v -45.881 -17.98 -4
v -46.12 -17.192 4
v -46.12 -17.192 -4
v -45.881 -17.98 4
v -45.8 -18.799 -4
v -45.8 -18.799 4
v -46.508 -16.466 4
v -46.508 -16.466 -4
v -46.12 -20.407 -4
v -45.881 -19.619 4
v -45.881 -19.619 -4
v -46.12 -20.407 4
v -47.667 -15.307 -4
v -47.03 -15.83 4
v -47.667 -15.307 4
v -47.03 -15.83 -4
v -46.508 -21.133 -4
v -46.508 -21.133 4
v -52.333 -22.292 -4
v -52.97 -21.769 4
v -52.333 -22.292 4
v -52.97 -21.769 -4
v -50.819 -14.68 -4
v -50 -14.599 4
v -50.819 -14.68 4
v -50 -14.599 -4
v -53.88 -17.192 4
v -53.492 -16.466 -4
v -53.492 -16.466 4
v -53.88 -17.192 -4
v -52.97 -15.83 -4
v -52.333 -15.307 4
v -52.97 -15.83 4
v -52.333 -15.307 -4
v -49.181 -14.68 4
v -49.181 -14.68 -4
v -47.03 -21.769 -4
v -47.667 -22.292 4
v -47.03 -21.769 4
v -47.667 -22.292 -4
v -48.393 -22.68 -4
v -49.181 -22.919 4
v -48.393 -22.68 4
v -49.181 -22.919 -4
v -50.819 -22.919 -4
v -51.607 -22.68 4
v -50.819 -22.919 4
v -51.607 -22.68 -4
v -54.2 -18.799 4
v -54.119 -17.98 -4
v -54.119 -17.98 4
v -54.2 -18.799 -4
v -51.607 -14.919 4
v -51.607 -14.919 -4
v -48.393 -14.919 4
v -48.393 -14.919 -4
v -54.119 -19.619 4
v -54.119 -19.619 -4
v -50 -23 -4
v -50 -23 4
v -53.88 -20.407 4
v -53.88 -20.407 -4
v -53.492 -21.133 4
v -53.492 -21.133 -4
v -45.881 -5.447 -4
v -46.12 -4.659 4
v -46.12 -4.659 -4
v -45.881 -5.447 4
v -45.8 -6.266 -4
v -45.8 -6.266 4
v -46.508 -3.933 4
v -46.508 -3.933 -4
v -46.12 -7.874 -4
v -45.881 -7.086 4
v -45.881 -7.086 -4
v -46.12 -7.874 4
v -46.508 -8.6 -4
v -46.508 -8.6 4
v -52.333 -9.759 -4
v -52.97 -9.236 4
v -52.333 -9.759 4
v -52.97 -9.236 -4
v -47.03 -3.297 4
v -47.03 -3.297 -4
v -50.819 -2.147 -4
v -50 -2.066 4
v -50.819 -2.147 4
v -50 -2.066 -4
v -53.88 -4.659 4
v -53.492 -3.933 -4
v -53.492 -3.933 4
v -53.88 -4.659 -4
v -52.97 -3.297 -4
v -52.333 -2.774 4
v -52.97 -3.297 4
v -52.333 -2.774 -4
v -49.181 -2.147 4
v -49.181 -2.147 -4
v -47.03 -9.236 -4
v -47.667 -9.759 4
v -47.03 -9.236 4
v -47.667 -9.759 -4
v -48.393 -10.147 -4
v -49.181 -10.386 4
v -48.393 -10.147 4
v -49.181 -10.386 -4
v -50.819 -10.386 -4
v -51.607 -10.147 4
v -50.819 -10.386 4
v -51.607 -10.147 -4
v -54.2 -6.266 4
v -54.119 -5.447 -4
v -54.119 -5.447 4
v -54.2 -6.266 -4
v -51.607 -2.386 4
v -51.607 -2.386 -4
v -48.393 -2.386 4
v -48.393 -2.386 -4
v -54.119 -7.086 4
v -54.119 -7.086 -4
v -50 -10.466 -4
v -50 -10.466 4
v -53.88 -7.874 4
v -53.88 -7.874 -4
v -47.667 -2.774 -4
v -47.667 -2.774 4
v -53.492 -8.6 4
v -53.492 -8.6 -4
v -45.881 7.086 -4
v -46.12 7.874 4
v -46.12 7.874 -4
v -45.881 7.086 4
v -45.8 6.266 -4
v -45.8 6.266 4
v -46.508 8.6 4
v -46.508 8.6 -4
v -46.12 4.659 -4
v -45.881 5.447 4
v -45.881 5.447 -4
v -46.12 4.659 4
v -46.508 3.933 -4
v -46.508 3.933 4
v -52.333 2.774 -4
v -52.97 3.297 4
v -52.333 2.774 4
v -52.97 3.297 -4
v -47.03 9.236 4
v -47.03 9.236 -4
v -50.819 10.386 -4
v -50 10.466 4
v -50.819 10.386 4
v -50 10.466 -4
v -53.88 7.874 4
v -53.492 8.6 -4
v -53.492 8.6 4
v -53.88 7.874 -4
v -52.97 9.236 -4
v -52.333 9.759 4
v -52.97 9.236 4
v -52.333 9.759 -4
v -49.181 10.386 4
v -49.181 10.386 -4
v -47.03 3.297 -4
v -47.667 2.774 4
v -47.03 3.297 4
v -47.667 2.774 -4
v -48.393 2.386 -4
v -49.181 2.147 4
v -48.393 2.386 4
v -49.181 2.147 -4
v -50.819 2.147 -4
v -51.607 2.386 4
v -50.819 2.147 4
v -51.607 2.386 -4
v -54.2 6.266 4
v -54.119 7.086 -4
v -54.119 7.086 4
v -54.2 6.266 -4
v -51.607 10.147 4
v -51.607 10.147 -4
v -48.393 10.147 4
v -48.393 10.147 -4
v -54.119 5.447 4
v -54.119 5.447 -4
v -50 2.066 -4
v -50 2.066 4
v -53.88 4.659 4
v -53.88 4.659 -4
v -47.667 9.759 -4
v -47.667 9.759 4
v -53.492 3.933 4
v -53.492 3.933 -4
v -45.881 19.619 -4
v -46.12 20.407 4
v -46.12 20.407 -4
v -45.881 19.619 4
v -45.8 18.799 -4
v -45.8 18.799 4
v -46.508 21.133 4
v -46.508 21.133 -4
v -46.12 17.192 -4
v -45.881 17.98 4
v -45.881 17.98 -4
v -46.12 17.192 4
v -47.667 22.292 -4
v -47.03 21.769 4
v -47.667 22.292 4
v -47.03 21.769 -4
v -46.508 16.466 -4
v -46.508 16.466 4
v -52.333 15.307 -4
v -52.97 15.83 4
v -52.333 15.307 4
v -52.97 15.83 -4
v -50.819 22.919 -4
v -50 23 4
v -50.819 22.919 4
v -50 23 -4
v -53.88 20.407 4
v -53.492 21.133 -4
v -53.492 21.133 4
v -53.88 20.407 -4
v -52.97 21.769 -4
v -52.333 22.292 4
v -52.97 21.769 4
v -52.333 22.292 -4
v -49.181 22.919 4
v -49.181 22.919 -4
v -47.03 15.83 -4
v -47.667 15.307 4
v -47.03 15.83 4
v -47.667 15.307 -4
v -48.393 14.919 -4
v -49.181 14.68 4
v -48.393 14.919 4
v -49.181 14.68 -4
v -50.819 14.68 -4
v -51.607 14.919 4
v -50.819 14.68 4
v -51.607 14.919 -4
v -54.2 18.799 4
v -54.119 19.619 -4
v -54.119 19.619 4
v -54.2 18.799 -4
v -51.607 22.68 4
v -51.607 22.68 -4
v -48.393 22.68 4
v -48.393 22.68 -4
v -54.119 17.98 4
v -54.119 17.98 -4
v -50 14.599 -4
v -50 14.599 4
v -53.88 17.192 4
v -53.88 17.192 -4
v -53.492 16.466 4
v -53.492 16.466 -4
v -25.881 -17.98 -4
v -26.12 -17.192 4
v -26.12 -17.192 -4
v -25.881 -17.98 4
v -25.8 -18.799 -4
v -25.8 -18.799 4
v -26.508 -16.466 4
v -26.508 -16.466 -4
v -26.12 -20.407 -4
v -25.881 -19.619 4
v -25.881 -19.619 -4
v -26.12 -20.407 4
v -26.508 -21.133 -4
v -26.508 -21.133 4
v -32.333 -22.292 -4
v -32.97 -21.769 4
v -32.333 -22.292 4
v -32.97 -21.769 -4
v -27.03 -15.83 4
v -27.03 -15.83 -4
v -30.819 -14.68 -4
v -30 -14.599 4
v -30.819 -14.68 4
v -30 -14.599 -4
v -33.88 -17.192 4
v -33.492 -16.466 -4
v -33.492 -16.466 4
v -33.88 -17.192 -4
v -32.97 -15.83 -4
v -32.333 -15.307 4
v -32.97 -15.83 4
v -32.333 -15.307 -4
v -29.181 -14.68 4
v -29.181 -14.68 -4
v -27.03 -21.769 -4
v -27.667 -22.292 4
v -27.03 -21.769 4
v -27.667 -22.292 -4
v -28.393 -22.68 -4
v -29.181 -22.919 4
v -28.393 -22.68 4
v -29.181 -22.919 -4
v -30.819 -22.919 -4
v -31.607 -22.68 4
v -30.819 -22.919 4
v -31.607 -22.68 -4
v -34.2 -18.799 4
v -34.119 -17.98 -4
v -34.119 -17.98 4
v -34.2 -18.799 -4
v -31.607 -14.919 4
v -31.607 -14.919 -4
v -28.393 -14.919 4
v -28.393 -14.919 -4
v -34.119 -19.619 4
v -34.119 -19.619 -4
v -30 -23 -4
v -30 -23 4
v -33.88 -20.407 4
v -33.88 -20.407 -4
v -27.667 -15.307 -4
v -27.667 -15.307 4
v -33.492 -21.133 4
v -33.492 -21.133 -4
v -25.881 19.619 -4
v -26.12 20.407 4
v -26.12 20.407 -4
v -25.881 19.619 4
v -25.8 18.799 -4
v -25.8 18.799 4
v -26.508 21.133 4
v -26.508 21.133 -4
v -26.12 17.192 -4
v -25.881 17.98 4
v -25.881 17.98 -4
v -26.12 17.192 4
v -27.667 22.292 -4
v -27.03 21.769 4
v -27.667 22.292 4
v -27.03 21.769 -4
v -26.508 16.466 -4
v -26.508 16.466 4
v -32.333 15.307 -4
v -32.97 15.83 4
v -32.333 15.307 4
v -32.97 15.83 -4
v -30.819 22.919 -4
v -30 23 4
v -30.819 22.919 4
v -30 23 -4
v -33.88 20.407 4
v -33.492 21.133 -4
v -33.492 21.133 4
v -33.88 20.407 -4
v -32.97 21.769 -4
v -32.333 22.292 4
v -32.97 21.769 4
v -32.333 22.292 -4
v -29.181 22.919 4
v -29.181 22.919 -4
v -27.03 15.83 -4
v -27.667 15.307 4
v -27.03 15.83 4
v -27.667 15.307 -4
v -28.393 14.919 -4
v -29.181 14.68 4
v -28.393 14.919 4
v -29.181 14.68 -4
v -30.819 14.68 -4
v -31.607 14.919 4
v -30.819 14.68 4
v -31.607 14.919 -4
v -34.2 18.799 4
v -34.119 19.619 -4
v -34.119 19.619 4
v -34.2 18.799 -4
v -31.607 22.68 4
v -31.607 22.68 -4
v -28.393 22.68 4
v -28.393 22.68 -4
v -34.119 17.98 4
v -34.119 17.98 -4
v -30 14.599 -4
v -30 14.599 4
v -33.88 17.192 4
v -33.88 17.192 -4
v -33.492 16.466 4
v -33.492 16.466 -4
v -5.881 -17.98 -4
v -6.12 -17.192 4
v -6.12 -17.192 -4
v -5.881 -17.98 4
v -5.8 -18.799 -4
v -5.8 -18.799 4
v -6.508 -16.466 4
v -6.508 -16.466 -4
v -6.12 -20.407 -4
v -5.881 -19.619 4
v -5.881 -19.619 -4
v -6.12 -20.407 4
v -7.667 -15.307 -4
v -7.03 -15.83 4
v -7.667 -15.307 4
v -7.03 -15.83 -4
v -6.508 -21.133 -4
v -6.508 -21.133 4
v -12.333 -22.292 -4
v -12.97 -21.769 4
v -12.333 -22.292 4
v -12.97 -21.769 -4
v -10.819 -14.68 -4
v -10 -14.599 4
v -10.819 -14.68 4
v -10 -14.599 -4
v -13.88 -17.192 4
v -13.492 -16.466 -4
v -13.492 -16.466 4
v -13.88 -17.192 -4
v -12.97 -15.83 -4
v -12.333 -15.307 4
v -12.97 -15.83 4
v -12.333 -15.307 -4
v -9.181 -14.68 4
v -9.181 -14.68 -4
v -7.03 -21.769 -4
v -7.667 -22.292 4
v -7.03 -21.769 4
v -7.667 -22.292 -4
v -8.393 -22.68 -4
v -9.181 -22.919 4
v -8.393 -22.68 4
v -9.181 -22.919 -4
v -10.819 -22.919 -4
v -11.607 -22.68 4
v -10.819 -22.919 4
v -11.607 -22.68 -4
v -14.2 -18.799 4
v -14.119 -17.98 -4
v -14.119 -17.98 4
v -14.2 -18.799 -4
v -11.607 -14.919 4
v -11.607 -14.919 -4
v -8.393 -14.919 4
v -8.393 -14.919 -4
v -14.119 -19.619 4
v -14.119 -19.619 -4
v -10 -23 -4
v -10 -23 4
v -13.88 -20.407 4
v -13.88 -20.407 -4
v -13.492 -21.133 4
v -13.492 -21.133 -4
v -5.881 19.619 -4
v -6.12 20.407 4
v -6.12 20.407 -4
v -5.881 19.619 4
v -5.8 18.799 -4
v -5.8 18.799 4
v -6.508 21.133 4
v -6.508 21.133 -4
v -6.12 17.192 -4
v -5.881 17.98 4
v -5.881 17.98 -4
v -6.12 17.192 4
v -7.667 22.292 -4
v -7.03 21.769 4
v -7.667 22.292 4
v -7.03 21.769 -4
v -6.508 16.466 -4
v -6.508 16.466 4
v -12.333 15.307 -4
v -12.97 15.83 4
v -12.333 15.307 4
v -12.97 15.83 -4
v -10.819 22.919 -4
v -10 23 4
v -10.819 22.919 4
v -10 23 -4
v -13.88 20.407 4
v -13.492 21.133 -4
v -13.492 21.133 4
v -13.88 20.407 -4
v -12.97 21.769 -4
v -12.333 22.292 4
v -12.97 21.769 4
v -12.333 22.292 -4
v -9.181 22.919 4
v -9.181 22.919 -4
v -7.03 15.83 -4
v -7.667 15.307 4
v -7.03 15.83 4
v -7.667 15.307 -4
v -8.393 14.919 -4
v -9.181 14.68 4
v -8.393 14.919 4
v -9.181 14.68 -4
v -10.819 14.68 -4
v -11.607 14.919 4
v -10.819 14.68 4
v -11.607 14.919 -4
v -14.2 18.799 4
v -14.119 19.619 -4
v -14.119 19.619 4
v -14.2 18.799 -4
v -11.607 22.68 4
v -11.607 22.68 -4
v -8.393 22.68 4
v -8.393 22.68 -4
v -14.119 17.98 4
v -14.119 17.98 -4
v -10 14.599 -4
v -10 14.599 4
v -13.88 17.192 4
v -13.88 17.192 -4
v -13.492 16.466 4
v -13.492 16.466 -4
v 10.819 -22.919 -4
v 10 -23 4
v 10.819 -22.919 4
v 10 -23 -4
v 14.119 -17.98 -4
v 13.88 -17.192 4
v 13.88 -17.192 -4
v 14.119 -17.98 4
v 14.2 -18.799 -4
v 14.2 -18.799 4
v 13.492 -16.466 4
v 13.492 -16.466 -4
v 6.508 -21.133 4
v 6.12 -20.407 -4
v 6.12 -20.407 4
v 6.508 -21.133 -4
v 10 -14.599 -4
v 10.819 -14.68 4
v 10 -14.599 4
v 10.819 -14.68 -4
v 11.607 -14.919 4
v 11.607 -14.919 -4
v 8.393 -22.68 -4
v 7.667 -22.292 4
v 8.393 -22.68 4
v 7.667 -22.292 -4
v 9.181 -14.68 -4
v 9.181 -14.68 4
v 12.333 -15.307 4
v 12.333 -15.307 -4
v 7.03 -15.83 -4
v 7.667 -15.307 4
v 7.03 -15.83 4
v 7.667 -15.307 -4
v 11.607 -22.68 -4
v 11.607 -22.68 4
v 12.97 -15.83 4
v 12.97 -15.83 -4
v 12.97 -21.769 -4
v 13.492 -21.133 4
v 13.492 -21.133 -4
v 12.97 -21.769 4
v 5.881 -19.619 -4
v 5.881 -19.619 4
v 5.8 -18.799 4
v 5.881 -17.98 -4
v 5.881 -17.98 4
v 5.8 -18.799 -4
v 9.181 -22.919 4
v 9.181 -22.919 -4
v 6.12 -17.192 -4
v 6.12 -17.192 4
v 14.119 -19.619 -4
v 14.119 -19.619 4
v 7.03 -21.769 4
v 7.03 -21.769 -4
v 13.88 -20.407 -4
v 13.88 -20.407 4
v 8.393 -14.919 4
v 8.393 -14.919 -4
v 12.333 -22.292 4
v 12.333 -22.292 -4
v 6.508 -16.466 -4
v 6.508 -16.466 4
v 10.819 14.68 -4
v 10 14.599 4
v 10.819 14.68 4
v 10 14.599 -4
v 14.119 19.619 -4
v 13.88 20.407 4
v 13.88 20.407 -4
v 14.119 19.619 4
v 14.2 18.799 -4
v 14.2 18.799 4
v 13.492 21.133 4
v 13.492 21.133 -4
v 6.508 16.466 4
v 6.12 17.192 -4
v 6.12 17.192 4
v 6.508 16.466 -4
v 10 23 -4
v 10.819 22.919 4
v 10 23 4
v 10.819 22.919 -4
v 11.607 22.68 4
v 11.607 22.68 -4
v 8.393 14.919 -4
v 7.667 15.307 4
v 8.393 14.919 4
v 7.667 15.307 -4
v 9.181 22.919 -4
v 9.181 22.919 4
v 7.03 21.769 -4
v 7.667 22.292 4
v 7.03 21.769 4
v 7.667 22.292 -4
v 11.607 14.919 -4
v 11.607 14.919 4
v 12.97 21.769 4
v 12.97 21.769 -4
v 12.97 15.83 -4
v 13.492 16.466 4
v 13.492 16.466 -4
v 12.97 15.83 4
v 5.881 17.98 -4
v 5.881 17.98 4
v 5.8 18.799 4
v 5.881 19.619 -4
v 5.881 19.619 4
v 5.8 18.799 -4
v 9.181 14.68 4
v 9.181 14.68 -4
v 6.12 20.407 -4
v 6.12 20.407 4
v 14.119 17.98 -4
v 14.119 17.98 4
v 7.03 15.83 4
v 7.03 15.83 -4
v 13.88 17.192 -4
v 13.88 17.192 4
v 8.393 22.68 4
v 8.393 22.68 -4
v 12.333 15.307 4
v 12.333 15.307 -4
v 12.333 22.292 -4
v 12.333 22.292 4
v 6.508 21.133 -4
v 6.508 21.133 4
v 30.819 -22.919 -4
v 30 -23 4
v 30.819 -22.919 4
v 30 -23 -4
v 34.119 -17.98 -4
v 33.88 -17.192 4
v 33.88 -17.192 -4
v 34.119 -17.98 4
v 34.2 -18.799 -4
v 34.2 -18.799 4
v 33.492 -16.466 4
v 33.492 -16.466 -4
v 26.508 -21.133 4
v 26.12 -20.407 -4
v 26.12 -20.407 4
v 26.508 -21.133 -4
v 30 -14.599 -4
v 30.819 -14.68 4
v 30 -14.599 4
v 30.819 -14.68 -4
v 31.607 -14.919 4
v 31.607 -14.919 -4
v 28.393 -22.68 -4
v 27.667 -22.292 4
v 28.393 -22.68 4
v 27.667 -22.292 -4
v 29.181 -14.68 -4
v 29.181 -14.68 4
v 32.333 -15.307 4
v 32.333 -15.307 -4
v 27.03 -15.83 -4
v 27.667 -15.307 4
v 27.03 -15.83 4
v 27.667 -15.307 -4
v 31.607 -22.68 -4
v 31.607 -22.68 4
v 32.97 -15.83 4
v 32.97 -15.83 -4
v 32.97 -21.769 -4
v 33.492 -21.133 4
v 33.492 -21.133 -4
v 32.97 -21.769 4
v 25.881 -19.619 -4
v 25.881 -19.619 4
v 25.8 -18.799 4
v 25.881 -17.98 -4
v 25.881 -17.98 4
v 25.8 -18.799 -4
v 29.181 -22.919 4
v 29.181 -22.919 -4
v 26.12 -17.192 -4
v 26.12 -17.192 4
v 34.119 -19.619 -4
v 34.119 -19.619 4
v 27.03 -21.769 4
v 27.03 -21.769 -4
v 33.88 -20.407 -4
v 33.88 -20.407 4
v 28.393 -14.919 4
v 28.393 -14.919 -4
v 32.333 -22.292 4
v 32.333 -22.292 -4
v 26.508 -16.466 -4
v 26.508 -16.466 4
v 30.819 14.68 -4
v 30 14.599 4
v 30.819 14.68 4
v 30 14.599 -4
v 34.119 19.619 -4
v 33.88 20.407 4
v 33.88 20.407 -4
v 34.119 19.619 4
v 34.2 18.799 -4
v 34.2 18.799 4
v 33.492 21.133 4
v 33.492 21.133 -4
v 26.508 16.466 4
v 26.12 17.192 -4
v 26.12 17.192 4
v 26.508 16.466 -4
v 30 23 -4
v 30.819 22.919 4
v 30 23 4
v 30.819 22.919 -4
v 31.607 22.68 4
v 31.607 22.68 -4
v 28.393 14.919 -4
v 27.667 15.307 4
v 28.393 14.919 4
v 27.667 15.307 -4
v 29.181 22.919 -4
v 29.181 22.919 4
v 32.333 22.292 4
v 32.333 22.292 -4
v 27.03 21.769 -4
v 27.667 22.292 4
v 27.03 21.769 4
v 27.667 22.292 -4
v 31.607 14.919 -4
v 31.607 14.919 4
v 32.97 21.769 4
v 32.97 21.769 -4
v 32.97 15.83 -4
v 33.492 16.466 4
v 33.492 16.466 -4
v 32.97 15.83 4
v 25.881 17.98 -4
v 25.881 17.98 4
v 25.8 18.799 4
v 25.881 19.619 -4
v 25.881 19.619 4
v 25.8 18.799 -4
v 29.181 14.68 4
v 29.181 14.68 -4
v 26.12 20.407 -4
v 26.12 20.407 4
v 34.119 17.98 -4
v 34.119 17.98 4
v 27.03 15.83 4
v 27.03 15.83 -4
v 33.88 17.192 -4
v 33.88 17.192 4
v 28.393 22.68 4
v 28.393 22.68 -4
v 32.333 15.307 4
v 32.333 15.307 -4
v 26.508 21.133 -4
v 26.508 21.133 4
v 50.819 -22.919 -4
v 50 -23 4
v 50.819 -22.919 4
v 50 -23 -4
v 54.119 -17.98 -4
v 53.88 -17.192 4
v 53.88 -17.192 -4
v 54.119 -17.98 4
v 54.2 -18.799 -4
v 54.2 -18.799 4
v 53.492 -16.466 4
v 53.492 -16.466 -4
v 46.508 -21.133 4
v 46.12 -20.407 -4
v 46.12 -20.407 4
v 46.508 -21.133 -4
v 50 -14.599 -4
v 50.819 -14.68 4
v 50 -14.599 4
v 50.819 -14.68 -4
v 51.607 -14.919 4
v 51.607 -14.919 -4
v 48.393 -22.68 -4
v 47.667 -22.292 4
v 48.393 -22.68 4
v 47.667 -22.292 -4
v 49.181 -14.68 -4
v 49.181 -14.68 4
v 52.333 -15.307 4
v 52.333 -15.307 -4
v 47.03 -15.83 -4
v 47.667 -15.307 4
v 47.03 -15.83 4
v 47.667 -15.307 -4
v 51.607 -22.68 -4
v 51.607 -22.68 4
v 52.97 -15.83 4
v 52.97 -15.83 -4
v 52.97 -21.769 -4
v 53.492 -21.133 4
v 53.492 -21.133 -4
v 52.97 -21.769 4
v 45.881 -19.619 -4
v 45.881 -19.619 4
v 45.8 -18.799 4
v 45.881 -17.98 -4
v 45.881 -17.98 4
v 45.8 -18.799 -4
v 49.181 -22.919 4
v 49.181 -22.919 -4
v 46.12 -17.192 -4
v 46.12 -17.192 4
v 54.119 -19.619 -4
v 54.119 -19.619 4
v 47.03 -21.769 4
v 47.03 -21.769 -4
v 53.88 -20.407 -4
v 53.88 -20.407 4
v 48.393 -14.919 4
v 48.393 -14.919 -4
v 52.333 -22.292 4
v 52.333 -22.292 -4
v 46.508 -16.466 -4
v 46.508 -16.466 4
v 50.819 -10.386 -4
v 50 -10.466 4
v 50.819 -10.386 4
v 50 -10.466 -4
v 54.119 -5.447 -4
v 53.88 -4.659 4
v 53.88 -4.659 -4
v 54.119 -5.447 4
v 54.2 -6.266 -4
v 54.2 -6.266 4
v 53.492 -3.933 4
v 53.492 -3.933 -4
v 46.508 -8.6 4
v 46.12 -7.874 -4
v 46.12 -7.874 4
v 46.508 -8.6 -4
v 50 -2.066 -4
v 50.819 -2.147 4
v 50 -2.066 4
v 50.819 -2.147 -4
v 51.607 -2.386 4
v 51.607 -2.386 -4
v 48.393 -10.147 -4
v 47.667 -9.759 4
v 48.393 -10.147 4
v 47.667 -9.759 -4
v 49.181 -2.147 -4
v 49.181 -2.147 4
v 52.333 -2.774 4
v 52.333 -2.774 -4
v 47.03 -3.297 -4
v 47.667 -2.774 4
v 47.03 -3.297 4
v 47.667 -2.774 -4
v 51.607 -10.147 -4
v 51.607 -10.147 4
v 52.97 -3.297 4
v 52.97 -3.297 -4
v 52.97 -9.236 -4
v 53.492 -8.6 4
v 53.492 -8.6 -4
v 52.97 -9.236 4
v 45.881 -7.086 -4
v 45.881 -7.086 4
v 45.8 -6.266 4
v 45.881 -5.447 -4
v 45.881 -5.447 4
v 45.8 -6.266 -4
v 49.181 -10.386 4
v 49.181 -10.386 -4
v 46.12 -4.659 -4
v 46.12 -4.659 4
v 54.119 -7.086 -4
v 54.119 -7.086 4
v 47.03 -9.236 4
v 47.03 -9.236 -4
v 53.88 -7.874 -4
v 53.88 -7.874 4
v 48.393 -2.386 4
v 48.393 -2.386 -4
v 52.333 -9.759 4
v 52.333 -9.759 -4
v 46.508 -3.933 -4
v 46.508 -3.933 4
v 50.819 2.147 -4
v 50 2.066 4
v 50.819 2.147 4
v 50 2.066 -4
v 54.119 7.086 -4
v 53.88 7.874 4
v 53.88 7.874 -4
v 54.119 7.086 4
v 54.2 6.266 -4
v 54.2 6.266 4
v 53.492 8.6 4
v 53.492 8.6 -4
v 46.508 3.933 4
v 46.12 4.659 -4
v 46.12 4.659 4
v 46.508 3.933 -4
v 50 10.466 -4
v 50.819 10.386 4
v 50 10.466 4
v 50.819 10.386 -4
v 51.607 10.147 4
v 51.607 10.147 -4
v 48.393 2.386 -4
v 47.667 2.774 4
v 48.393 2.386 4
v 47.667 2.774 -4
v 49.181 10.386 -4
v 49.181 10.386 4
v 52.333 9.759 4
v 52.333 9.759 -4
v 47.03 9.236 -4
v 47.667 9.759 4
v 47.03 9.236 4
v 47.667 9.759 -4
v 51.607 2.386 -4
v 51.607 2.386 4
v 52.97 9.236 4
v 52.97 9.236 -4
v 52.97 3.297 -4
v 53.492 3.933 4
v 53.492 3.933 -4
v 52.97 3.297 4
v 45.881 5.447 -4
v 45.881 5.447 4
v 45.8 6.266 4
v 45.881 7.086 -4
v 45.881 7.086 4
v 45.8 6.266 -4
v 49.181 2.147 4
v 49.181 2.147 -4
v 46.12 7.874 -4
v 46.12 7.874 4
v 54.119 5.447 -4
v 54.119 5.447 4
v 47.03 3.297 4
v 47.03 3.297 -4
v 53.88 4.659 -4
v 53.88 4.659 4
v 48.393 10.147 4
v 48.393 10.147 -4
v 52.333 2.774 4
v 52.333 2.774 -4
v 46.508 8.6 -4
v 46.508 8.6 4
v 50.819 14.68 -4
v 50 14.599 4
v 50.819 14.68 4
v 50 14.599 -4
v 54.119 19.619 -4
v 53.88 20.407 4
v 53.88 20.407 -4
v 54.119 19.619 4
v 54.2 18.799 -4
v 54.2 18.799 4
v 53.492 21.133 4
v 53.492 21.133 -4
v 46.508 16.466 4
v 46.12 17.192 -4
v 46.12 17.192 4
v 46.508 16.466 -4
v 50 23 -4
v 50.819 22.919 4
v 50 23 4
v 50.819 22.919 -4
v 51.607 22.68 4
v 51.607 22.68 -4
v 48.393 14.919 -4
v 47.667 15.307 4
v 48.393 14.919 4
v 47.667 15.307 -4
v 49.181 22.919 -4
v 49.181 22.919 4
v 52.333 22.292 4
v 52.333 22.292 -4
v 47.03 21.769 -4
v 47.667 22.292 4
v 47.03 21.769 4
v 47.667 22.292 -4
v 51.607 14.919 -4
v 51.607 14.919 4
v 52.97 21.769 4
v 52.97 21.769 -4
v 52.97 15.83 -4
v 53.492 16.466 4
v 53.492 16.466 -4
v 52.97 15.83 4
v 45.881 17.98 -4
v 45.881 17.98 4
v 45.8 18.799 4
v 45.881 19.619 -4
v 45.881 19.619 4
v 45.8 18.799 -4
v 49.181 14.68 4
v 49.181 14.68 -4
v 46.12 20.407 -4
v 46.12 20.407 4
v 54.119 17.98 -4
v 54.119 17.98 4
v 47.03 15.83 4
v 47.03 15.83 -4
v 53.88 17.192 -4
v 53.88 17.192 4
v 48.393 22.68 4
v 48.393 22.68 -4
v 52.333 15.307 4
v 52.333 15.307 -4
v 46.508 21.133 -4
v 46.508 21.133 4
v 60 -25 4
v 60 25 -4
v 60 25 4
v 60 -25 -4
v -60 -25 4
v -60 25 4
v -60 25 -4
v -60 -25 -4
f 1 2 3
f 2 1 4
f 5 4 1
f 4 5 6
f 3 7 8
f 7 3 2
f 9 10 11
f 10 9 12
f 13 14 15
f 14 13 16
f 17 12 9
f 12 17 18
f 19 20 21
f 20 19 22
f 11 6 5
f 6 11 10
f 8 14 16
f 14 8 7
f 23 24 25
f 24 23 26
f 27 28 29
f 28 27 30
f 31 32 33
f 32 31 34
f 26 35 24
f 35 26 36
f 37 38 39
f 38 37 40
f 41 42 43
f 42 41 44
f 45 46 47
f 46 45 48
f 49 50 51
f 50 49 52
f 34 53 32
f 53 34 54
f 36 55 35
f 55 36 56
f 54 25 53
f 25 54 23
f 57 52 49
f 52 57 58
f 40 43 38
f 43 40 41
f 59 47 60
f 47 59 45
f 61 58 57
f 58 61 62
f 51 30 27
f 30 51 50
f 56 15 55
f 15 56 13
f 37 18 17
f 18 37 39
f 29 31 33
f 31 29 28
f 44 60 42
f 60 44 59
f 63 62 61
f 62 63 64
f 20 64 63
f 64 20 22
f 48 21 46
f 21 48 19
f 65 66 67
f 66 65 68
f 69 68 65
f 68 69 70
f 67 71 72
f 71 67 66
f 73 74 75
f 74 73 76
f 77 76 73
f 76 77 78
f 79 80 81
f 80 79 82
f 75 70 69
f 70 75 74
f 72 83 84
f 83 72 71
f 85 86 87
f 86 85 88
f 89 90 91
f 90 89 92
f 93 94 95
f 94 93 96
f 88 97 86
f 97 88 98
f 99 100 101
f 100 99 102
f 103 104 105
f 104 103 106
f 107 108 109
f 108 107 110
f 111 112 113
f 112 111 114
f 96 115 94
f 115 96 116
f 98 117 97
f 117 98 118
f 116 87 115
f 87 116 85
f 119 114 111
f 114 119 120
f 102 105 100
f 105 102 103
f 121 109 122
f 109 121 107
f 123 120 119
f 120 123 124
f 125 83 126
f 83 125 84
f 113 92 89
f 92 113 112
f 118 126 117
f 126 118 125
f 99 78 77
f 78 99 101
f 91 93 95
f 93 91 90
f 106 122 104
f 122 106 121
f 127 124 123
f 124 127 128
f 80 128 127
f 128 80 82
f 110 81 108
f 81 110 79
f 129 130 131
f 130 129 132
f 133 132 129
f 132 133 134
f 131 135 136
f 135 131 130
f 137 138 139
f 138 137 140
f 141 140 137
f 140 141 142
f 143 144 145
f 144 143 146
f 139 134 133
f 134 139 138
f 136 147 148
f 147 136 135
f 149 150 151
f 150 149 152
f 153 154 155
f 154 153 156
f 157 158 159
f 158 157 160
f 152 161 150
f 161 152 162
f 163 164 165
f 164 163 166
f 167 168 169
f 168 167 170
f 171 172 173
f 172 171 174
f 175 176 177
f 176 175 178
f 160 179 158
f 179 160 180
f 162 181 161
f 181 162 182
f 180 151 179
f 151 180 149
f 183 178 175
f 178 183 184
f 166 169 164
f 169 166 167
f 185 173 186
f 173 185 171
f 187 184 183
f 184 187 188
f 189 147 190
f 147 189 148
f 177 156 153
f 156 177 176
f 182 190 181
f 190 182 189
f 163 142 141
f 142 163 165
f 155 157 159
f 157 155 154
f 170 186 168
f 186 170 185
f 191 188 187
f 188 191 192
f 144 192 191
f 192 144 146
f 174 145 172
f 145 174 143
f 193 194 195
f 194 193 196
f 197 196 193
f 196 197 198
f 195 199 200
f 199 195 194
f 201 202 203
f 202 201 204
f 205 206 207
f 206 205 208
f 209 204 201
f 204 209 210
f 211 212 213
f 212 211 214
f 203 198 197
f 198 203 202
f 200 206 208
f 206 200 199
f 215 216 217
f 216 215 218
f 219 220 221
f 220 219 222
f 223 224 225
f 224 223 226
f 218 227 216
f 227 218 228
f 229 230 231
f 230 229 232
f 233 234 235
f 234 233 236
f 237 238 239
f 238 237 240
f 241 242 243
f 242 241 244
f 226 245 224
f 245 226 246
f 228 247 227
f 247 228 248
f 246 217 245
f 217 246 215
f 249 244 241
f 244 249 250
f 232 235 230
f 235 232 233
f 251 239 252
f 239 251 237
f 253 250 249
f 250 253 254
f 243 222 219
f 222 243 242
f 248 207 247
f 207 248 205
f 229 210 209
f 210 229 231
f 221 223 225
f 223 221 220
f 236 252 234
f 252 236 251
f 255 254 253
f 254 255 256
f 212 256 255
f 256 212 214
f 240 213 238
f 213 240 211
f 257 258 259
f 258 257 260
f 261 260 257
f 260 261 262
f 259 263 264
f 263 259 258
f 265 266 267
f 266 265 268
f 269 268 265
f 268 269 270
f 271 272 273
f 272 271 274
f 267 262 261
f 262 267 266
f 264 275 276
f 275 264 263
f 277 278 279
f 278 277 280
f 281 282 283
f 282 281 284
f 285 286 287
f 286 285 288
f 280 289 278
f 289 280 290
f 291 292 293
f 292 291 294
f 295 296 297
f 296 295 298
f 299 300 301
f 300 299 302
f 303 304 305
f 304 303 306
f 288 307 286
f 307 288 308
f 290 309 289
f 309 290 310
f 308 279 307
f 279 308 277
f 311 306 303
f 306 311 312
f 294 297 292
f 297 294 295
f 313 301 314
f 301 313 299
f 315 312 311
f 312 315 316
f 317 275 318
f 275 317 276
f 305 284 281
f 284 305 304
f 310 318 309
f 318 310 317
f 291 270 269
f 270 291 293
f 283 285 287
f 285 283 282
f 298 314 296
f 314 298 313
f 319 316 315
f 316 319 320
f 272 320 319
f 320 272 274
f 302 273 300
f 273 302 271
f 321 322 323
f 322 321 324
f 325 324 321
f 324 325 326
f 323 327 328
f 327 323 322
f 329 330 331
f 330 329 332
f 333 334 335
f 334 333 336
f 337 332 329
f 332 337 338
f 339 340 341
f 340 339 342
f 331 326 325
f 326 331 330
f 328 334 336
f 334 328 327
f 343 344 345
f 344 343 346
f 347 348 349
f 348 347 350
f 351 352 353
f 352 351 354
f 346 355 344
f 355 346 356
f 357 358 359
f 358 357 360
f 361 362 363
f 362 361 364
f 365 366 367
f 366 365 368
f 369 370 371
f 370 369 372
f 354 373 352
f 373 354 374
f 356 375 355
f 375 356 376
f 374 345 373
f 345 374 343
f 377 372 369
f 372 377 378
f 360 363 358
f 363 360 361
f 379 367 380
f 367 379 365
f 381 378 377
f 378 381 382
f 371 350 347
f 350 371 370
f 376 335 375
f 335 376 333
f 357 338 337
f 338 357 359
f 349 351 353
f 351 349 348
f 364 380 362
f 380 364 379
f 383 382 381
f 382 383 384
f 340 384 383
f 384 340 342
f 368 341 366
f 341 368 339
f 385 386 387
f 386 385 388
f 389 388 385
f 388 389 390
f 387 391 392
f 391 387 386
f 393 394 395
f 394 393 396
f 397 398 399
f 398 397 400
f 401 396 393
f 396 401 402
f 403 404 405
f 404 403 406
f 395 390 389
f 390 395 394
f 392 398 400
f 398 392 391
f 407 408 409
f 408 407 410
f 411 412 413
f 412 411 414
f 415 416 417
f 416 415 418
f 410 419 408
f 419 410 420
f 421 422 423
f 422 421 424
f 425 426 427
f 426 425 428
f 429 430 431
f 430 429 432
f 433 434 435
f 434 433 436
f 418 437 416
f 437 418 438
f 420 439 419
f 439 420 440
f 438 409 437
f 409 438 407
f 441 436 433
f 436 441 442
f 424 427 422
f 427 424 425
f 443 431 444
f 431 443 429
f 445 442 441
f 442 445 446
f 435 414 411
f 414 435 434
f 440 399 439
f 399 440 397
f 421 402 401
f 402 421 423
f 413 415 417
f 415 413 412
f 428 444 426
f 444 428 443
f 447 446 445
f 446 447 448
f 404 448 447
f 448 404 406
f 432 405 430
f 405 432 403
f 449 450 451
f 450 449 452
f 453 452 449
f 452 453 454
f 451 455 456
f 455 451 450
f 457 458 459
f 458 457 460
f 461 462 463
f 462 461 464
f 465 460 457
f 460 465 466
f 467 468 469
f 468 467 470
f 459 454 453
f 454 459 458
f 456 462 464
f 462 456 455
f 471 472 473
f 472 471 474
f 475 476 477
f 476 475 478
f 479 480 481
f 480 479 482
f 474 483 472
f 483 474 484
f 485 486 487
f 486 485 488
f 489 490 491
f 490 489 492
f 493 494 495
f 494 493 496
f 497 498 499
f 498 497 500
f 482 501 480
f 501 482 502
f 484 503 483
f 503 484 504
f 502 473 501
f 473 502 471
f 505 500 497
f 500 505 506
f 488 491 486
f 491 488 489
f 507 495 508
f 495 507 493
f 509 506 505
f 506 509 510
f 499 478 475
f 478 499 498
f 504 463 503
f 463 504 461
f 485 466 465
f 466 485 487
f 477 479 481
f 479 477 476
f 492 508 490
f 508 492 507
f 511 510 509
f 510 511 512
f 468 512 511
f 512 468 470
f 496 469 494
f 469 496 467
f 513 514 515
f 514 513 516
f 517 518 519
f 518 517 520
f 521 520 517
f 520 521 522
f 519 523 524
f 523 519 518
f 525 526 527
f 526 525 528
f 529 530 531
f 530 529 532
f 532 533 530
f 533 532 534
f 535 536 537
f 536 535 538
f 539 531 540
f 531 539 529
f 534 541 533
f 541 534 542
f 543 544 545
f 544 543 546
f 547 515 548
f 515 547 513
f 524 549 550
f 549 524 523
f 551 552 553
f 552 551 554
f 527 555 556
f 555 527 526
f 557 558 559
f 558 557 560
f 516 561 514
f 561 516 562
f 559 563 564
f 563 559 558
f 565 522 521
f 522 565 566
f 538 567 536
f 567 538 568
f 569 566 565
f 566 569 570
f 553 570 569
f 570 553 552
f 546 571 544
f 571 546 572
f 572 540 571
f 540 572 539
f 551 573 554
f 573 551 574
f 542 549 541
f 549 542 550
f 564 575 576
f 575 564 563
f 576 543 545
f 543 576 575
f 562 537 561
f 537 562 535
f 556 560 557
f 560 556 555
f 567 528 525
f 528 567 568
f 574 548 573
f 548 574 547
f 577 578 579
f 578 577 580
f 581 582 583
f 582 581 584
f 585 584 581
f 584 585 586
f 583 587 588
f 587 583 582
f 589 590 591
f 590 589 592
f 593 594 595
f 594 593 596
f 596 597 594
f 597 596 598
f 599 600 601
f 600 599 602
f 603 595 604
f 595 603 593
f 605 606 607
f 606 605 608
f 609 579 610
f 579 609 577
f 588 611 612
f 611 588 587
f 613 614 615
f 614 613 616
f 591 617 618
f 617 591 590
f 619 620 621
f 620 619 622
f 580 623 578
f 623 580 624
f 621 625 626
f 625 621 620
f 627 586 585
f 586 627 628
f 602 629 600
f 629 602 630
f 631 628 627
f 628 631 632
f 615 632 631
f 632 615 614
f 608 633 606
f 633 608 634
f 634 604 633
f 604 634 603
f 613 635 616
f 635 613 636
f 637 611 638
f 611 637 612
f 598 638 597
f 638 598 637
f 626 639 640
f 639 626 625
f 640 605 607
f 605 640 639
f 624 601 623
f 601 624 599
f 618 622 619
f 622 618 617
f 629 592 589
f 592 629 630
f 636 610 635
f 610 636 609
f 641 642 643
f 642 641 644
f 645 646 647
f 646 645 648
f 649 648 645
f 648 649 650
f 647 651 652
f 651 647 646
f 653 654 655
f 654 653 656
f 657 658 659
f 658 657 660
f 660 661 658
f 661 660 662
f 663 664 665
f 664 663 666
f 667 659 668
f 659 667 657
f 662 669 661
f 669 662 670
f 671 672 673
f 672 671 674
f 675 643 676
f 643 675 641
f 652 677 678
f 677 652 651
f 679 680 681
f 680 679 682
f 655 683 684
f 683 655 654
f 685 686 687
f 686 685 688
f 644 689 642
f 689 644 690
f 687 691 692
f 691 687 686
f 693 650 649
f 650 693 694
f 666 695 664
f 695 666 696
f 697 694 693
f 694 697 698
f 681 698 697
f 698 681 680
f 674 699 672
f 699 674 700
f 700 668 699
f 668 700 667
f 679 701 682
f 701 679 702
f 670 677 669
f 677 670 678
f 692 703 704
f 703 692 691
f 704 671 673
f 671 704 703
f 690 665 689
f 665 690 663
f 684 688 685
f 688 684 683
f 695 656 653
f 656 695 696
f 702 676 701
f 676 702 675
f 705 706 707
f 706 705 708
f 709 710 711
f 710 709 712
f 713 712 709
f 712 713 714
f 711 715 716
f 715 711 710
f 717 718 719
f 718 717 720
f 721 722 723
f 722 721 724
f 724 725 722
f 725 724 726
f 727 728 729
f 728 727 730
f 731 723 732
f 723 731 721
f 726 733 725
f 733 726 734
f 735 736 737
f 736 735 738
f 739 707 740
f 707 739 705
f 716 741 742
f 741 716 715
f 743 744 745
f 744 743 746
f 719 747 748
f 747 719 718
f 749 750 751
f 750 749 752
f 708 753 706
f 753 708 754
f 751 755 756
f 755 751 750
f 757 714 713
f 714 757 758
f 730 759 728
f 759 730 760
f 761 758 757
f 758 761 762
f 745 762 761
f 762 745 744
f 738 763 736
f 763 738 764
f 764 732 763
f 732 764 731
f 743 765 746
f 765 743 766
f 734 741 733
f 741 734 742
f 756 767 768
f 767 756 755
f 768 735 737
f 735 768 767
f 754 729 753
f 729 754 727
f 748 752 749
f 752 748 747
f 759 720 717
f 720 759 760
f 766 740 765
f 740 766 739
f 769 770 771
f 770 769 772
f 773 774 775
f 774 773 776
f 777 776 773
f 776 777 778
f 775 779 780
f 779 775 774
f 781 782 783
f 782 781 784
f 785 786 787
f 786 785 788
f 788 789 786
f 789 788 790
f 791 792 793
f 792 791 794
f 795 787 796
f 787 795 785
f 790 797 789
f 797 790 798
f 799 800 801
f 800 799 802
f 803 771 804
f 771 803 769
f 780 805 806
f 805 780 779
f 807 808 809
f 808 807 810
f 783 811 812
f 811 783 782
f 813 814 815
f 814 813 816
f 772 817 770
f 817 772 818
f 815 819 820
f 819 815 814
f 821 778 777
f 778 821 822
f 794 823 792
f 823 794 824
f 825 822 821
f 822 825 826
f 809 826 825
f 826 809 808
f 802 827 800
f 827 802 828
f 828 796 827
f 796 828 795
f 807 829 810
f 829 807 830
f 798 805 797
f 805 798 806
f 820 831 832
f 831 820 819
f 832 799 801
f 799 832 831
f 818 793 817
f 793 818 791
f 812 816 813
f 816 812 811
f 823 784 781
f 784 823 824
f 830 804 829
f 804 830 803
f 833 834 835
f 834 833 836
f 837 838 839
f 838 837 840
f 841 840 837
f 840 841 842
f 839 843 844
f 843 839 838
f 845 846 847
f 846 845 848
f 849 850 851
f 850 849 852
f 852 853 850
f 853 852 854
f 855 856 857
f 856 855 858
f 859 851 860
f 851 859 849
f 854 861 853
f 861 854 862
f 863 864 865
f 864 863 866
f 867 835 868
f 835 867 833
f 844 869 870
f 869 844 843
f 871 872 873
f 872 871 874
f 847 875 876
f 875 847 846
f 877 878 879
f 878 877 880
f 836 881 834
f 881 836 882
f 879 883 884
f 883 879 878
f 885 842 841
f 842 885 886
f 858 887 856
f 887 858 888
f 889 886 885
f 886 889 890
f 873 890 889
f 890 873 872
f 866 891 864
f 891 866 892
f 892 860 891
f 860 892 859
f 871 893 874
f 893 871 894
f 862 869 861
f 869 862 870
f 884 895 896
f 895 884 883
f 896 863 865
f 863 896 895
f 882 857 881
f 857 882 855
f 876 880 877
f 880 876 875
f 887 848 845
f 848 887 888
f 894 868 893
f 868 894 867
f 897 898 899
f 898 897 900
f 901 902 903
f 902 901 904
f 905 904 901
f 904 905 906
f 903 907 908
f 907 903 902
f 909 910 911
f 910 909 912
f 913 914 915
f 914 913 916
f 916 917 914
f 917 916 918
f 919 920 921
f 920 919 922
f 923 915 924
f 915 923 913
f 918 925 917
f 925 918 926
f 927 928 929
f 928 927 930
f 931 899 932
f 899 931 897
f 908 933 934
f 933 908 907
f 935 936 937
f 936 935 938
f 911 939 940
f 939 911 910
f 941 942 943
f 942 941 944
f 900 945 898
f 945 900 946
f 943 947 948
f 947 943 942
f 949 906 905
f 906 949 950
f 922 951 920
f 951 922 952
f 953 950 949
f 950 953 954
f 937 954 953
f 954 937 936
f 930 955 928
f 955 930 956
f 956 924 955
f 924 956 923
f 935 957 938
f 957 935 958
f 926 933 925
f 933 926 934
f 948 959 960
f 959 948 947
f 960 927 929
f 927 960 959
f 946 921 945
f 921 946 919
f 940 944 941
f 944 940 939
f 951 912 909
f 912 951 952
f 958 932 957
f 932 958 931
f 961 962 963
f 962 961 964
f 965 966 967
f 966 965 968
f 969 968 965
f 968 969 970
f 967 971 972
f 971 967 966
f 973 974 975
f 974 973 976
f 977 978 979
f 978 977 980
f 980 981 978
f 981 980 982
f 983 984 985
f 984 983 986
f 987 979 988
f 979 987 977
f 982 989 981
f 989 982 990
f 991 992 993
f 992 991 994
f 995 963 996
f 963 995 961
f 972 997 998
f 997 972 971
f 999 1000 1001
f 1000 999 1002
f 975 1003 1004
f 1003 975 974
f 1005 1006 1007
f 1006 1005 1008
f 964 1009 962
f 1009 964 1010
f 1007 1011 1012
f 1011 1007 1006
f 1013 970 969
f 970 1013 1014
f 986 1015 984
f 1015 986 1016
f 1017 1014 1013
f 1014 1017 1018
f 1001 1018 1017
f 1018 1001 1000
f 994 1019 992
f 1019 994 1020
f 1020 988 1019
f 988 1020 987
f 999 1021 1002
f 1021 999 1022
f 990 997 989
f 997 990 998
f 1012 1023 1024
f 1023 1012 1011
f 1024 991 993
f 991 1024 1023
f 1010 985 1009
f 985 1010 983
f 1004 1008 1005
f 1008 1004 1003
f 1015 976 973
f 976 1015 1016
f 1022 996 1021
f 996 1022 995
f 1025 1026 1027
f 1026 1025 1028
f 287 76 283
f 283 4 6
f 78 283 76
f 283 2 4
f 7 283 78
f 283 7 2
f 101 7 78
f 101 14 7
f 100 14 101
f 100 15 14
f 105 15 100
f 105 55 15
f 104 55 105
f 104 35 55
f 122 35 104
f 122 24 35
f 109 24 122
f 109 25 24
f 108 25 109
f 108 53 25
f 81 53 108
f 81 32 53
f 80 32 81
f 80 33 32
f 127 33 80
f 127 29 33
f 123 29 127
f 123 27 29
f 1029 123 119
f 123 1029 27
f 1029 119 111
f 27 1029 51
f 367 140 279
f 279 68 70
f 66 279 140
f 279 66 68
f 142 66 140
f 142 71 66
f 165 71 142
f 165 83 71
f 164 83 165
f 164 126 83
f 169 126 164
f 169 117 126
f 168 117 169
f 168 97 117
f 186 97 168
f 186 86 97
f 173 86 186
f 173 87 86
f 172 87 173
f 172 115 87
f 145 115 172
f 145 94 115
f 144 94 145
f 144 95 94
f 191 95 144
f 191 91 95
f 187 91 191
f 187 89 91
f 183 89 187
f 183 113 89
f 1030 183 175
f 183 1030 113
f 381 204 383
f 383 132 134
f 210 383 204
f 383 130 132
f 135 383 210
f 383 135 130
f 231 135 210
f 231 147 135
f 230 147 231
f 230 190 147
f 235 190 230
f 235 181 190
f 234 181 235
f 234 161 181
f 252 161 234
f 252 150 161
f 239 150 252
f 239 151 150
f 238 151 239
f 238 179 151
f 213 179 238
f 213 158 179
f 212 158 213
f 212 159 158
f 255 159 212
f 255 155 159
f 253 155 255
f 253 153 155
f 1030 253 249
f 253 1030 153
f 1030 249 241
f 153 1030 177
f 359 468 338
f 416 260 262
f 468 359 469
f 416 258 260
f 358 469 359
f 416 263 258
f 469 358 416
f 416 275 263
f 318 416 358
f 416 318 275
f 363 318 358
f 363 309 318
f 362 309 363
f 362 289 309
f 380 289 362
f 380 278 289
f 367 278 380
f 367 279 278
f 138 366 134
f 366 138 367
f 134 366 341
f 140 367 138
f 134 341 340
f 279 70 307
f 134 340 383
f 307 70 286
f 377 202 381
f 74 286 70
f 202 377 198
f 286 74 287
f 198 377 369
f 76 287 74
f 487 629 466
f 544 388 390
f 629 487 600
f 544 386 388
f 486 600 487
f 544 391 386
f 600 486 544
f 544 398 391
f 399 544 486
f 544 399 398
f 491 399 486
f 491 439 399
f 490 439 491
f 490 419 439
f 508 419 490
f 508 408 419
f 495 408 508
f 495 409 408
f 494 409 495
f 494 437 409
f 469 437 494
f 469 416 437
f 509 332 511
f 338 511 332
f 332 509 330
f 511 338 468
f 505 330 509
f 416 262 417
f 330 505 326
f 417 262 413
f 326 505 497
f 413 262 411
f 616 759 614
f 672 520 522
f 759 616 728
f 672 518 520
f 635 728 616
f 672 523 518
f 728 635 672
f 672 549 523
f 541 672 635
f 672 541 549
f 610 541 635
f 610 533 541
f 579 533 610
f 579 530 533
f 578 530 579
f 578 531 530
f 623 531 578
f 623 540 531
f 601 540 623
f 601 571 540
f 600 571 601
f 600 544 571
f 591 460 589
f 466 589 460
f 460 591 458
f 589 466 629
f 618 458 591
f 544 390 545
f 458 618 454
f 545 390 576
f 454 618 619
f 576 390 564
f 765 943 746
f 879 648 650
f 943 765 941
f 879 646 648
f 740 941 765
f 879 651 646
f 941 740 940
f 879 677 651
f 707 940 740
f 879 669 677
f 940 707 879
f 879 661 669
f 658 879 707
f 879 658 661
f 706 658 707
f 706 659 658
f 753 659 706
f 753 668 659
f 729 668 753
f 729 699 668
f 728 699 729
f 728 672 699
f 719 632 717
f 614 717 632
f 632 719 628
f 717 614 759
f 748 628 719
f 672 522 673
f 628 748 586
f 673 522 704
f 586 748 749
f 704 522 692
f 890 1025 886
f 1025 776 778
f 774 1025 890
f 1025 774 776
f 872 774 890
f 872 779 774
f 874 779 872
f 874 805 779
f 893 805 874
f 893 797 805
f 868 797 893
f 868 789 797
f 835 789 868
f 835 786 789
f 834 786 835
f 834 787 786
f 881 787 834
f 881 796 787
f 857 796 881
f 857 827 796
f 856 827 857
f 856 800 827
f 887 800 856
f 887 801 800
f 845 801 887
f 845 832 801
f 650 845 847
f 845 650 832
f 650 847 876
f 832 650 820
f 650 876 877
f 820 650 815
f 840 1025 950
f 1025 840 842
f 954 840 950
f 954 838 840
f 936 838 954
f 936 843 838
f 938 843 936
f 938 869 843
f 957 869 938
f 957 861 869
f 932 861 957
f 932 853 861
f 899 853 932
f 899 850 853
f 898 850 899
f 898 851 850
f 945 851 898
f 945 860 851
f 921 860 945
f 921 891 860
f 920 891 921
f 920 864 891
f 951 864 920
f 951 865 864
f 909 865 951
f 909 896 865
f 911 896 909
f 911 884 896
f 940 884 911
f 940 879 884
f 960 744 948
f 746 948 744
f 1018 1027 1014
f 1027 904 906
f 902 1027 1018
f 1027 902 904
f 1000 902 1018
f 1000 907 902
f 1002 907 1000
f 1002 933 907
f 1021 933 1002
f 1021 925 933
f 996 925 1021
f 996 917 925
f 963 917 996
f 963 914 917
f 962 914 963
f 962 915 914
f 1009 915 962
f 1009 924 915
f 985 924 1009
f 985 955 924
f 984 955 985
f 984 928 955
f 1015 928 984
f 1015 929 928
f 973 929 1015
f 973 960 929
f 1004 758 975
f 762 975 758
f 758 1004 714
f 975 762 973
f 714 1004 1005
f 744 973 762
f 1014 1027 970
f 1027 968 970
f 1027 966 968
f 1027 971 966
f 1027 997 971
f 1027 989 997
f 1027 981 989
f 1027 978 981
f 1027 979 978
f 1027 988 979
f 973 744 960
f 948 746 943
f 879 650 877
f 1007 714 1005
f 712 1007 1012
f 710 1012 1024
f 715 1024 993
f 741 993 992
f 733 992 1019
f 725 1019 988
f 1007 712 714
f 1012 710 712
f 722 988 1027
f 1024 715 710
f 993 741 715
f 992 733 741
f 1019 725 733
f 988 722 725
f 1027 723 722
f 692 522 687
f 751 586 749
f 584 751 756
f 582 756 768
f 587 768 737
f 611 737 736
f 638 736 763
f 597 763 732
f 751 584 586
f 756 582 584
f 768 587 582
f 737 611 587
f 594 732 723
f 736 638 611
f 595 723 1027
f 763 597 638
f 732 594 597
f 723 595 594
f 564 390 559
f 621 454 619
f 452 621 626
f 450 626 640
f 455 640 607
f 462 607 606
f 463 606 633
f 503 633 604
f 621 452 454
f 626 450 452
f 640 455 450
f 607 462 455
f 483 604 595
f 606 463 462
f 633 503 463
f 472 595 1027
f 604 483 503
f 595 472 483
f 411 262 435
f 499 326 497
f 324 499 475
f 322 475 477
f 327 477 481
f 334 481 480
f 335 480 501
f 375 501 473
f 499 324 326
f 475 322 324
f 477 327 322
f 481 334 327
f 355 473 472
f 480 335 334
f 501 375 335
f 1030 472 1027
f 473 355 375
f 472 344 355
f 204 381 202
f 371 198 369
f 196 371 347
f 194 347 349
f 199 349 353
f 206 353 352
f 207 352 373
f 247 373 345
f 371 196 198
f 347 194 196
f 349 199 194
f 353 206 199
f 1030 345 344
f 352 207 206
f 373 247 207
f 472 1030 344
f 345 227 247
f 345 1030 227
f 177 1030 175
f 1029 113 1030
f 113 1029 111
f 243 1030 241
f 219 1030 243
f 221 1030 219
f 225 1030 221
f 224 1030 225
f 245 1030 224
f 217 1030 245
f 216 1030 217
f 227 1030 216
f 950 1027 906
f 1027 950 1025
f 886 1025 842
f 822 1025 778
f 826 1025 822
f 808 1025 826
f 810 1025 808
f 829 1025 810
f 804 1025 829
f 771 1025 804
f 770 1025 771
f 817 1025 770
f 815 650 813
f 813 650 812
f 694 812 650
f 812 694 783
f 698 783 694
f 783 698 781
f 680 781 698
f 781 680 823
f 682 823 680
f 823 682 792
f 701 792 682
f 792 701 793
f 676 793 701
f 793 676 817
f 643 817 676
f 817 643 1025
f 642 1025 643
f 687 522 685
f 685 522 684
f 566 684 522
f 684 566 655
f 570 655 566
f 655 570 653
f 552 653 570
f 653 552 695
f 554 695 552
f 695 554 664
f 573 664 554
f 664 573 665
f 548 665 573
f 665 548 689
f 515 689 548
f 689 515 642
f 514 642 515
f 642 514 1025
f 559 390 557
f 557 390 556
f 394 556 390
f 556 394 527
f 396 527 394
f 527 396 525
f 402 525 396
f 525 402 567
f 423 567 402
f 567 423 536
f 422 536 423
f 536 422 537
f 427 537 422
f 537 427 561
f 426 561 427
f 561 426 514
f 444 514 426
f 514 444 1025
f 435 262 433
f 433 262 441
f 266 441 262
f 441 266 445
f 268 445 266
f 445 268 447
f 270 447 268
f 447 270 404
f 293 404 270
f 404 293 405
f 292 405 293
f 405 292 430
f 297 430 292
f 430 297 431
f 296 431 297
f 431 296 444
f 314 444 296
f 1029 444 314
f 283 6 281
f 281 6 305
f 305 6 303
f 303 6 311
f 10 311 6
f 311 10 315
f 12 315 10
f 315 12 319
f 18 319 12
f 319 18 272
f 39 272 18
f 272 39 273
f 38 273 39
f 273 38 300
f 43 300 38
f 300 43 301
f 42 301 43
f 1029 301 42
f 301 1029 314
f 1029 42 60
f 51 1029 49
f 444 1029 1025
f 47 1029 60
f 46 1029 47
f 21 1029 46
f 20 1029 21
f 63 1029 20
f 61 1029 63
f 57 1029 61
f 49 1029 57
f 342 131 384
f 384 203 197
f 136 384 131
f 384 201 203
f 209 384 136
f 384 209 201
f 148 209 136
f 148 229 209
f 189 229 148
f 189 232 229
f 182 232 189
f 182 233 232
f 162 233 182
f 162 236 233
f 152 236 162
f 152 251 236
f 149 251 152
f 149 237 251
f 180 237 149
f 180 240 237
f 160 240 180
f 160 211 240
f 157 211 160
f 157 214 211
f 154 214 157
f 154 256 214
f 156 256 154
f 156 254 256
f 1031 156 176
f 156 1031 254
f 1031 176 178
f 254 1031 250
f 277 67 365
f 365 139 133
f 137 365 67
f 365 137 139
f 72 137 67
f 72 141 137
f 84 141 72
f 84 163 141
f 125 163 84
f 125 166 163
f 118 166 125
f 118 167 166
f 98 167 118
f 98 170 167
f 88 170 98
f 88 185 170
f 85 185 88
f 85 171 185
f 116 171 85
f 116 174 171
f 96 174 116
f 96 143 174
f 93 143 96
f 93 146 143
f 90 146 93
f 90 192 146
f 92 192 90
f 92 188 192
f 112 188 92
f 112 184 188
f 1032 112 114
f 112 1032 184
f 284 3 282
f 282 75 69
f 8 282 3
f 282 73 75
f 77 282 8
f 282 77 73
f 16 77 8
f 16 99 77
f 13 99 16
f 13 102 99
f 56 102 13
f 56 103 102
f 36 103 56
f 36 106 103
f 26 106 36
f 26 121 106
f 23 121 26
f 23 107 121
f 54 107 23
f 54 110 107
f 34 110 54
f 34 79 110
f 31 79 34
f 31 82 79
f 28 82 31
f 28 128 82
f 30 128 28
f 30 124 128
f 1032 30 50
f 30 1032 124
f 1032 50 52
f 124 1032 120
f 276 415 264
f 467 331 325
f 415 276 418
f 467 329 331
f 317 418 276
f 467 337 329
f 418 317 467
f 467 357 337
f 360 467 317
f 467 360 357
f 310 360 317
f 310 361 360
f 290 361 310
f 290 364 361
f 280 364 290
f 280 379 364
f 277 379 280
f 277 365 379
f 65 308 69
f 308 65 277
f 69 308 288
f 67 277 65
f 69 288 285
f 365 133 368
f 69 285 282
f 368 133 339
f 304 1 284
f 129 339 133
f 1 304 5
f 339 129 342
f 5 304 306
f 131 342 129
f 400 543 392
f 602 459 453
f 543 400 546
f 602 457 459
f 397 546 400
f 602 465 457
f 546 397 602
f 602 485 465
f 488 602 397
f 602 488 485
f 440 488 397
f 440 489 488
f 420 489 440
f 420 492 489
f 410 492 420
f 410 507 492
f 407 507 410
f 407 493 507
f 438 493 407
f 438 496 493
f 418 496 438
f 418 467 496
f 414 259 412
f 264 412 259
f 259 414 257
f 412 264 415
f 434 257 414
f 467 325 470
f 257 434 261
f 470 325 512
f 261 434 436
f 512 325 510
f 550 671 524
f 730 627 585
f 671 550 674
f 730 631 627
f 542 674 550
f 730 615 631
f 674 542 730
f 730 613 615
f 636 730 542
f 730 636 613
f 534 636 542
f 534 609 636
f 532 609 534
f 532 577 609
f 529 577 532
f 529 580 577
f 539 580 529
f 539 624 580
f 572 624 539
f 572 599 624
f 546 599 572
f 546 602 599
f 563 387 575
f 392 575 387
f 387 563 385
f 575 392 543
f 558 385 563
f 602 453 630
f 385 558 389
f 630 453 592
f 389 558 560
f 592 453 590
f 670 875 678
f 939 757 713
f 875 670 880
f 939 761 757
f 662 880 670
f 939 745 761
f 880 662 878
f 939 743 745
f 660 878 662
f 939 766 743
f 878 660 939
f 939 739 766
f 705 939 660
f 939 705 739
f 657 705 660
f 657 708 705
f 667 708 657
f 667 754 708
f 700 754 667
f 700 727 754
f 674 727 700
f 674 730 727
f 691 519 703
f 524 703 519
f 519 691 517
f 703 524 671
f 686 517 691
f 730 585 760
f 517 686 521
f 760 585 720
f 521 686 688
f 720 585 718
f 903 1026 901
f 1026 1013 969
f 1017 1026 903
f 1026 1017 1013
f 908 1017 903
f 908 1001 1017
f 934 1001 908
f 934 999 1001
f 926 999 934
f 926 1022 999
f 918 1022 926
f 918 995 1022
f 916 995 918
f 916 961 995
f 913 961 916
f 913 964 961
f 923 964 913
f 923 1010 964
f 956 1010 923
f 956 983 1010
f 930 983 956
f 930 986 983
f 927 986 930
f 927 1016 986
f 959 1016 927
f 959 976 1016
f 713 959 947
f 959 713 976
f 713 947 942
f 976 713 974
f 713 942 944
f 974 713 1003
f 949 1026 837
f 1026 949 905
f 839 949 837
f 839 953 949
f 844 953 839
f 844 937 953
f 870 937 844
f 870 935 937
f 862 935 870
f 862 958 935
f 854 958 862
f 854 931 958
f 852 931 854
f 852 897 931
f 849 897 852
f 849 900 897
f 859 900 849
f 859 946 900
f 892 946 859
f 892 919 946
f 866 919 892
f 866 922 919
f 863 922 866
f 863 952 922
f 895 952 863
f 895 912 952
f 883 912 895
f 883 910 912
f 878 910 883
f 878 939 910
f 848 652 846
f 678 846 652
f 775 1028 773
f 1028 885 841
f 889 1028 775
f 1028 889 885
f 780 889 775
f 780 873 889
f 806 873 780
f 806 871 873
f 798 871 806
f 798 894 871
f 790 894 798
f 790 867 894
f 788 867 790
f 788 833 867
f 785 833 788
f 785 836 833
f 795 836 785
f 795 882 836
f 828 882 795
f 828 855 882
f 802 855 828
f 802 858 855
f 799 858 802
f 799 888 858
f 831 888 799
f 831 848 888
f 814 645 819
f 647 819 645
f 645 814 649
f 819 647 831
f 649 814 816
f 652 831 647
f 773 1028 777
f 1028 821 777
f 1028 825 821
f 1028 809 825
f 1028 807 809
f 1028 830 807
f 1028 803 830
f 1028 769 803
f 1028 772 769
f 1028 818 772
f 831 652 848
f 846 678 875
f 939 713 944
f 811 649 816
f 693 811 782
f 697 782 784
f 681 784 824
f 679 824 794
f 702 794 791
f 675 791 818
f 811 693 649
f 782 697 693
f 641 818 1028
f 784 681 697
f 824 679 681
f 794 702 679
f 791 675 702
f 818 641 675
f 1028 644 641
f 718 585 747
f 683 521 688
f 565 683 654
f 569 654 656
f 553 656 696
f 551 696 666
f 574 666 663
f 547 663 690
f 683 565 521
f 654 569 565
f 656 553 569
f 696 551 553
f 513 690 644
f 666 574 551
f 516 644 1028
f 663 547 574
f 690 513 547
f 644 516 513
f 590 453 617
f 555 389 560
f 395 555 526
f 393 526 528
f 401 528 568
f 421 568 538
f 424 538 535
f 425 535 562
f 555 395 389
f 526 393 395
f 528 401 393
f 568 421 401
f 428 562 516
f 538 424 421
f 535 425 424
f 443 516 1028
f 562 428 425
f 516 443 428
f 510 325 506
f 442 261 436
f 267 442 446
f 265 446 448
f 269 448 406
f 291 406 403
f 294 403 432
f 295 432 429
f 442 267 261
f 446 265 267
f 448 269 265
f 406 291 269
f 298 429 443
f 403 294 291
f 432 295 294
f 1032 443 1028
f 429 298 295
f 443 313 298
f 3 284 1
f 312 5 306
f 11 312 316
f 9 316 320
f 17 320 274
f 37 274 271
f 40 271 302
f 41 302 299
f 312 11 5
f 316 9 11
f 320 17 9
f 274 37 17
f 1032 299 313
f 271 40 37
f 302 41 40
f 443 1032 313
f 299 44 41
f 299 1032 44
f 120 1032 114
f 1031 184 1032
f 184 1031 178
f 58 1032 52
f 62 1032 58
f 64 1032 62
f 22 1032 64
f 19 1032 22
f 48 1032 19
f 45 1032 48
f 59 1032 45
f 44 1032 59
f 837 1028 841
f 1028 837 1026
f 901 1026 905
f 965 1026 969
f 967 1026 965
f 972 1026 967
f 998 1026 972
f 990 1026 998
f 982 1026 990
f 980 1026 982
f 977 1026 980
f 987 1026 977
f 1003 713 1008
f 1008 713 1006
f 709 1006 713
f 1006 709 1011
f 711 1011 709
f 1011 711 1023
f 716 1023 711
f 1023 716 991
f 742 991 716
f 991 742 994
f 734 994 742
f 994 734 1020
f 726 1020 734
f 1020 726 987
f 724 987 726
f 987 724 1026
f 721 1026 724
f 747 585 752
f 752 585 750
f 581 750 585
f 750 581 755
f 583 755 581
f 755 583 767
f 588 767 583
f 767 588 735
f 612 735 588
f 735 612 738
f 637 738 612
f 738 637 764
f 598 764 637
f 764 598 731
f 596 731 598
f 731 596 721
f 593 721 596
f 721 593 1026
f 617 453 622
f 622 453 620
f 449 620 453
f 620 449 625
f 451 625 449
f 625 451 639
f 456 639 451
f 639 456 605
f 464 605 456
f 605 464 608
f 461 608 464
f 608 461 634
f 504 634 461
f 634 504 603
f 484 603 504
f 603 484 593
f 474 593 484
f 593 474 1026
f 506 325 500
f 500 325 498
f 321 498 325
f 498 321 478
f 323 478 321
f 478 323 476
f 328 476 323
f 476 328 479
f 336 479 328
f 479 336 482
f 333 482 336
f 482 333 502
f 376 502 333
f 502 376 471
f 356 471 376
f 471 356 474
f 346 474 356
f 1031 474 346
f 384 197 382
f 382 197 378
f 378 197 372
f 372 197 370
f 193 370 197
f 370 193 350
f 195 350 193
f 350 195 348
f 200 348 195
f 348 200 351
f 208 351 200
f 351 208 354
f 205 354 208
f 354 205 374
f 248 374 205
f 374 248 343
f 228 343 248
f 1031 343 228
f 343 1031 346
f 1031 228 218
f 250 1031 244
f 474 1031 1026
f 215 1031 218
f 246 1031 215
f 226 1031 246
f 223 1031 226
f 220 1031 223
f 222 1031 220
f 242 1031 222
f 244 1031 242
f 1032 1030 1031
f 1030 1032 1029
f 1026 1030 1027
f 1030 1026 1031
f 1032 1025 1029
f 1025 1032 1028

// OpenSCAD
$fn = 32;

// ----------------------------------------------------------------------
// Perforated panel 120 x 50 x 8
// 4 x 6 Ø8.4 holes, frame layout
// ----------------------------------------------------------------------

// --- parameters (mm) ---
panel = [120, 50, 8];  // overall size (x, y, z)
hole_d = 8.4;          // hole diameter
pitch_x = 20;          // hole pitch along X
pitch_y = 12.533;      // hole pitch along Y

// --- derived feature positions (mm) ---
margin = hole_d / 2 + 2;            // = 6.2   clearance from the panel edge
cols = floor((panel[0] - 2 * margin) / pitch_x) + 1;  // = 6   how many columns fit in X
rows = floor((panel[1] - 2 * margin) / pitch_y) + 1;  // = 4   how many rows fit in Y
span_x = (cols - 1) * pitch_x + 0;  // = 100   width of the field
span_y = (rows - 1) * pitch_y;      // = 37.6   height of the field
origin_x = -span_x / 2;             // = -50   X of the first hole
origin_y = -span_y / 2;             // = -18.8   Y of the first row
holes = 2 * cols + 2 * (rows - 2);  // = 16   holes around the frame
feature_centers = [
  [origin_x + 0 * pitch_x, origin_y + 0 * pitch_y],
  [origin_x + 0 * pitch_x, origin_y + 1 * pitch_y],
  [origin_x + 0 * pitch_x, origin_y + 2 * pitch_y],
  [origin_x + 0 * pitch_x, origin_y + 3 * pitch_y],
  [origin_x + 1 * pitch_x, origin_y + 0 * pitch_y],
  [origin_x + 1 * pitch_x, origin_y + 3 * pitch_y],
  [origin_x + 2 * pitch_x, origin_y + 0 * pitch_y],
  [origin_x + 2 * pitch_x, origin_y + 3 * pitch_y],
  [origin_x + 3 * pitch_x, origin_y + 0 * pitch_y],
  [origin_x + 3 * pitch_x, origin_y + 3 * pitch_y],
  [origin_x + 4 * pitch_x, origin_y + 0 * pitch_y],
  [origin_x + 4 * pitch_x, origin_y + 3 * pitch_y],
  [origin_x + 5 * pitch_x, origin_y + 0 * pitch_y],
  [origin_x + 5 * pitch_x, origin_y + 1 * pitch_y],
  [origin_x + 5 * pitch_x, origin_y + 2 * pitch_y],
  [origin_x + 5 * pitch_x, origin_y + 3 * pitch_y]
];   // hole centres, used verbatim by the cutter loop

// panel outline, every hole through
difference() {
  cube(panel, center = true);
  for (centre = feature_centers)
    translate([centre[0], centre[1], 0])
      cylinder(d = hole_d, h = panel[2] + 2, center = true);
}
